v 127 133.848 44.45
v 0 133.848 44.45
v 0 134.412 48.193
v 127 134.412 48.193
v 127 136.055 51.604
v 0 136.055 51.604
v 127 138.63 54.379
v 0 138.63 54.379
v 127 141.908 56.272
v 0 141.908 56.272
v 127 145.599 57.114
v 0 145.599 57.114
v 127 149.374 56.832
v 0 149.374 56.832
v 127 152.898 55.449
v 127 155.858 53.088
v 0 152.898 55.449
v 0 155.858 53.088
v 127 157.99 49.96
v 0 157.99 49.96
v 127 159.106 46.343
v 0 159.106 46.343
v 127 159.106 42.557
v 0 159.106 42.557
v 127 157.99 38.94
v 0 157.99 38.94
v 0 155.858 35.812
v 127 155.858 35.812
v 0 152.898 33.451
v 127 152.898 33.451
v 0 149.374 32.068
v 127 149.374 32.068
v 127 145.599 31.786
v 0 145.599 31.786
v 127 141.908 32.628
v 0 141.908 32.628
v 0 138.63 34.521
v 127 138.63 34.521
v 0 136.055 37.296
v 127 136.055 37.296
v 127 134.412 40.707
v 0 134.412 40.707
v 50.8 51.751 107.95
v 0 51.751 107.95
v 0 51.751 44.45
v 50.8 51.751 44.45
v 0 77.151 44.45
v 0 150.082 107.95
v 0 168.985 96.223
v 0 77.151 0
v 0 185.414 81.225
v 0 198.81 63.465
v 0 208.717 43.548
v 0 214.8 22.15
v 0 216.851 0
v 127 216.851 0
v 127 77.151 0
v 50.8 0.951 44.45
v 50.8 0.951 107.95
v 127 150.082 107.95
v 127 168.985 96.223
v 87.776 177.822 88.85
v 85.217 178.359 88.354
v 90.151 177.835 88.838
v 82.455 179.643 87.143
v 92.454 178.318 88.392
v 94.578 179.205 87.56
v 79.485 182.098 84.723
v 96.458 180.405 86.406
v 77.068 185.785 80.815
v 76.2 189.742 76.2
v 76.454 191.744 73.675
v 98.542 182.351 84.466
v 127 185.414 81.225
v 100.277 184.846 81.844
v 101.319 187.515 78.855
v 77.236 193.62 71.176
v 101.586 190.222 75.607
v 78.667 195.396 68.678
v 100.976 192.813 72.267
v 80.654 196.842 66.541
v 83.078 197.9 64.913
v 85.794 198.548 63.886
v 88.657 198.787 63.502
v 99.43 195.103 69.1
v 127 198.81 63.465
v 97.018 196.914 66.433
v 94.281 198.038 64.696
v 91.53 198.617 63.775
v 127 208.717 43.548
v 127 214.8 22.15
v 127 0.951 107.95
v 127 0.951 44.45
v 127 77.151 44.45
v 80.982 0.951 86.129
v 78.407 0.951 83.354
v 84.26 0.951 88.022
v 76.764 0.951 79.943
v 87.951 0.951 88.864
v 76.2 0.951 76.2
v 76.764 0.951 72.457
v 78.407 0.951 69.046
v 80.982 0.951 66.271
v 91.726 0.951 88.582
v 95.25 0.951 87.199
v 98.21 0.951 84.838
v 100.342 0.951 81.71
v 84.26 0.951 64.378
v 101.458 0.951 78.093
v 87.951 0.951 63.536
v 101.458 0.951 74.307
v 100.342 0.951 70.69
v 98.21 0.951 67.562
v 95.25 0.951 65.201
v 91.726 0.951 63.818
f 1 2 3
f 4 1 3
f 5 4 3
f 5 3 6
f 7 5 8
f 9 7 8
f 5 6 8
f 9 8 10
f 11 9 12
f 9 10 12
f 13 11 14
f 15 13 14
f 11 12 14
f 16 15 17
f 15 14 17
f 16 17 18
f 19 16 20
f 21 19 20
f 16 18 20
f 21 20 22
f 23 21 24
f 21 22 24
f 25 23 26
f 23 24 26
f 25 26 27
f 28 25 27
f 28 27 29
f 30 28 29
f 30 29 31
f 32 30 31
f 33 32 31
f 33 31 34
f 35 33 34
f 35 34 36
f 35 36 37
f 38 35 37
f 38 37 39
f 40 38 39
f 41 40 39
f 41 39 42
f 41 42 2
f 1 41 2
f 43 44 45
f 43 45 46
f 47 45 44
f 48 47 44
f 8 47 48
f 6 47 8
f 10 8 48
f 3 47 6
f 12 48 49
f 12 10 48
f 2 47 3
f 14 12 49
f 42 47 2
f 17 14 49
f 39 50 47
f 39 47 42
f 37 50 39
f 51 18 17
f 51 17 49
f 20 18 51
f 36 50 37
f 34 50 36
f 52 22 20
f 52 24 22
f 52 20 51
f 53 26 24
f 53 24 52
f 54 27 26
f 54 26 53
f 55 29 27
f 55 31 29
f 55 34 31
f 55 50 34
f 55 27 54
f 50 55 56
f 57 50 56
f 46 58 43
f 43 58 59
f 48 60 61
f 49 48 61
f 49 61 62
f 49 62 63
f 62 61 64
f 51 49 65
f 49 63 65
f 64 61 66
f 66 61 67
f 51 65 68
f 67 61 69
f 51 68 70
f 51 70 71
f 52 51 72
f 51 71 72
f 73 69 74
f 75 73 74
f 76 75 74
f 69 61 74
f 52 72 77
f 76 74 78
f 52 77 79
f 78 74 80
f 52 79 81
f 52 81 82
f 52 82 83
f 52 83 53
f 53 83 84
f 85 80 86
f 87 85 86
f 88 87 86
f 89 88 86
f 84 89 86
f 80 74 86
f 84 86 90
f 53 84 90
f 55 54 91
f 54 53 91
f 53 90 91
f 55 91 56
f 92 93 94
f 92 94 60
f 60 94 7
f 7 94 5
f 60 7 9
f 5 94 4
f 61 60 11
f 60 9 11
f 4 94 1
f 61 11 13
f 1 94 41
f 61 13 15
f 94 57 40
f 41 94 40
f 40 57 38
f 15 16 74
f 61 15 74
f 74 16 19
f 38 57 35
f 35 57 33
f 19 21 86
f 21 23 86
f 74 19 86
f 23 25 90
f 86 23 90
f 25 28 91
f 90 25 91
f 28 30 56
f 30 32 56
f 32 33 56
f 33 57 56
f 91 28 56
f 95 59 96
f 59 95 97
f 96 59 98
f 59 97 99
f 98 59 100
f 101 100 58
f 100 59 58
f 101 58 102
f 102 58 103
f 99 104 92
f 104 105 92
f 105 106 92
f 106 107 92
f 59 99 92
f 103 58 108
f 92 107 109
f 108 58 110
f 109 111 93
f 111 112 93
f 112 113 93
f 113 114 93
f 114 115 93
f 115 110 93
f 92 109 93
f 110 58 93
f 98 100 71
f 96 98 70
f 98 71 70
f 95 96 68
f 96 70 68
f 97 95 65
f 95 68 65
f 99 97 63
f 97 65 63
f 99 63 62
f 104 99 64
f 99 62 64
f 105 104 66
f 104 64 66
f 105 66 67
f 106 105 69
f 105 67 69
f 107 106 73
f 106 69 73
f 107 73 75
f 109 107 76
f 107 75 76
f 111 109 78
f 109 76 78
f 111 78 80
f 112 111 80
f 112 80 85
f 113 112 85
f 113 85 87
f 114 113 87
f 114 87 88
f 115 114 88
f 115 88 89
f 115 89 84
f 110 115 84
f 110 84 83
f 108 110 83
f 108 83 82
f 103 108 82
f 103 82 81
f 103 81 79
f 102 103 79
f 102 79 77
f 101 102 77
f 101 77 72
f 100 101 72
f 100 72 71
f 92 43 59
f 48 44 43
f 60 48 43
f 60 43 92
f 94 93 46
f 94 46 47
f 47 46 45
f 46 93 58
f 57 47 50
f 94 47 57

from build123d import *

# Parameters (mm, degrees)
F0_W      = 127
F0_H      = 215.9
F1_DEPTH  = 107.95
F3_W      = 76.2
F3_H      = 44.45
F3_W_2    = 50.8
F4_DEPTH  = 76.2
F5_D      = 25.4
F7_DEPTH  = 127.001
F9_D      = 25.4
F3_H_2    = 63.5
F10_DEPTH = 50.8


with BuildPart() as f1:
    # F0 (on Top) → F1 (new body)
    with BuildSketch(Plane.XY):
        with Locations((63.5, 108.900839)):
            Rectangle(F0_W, F0_H)
    extrude(amount=F1_DEPTH)

    # F3 (on face) → F4 (cut)
    with BuildSketch(Plane.XZ.offset(-0.950839)):
        with Locations((88.9, 22.225)):
            Rectangle(F3_W, F3_H)
        with Locations((25.4, 22.225)):
            Rectangle(F3_W_2, F3_H)
    extrude(amount=-F4_DEPTH, mode=Mode.SUBTRACT)

    # F5 (through all)
    with Locations(Plane.YZ.offset(127)):
        with Locations((146.548077, 44.45)):
            Hole(F5_D / 2)

    # F6 (on face) → F7 (cut, through all)
    with BuildSketch(Plane.YZ.offset(127)):
        with BuildLine():
            ThreePointArc((150.082376, 107.95), (198.809879, 63.46501), (216.850839, 0))
            Line((216.850839, 0), (216.850839, 107.95))
            Line((216.850839, 107.95), (150.082376, 107.95))
        make_face()
    extrude(amount=-F7_DEPTH, mode=Mode.SUBTRACT)

    # F9 (through all)
    with Locations(Plane.XZ.offset(-0.950839)):
        with Locations((88.9, 76.2)):
            Hole(F9_D / 2)

    # F3 (on face) → F10 (cut)
    with BuildSketch(Plane.XZ.offset(-0.950839)):
        with Locations((25.4, 76.2)):
            Rectangle(F3_W_2, F3_H_2)
    extrude(amount=-F10_DEPTH, mode=Mode.SUBTRACT)


solid = f1.part
